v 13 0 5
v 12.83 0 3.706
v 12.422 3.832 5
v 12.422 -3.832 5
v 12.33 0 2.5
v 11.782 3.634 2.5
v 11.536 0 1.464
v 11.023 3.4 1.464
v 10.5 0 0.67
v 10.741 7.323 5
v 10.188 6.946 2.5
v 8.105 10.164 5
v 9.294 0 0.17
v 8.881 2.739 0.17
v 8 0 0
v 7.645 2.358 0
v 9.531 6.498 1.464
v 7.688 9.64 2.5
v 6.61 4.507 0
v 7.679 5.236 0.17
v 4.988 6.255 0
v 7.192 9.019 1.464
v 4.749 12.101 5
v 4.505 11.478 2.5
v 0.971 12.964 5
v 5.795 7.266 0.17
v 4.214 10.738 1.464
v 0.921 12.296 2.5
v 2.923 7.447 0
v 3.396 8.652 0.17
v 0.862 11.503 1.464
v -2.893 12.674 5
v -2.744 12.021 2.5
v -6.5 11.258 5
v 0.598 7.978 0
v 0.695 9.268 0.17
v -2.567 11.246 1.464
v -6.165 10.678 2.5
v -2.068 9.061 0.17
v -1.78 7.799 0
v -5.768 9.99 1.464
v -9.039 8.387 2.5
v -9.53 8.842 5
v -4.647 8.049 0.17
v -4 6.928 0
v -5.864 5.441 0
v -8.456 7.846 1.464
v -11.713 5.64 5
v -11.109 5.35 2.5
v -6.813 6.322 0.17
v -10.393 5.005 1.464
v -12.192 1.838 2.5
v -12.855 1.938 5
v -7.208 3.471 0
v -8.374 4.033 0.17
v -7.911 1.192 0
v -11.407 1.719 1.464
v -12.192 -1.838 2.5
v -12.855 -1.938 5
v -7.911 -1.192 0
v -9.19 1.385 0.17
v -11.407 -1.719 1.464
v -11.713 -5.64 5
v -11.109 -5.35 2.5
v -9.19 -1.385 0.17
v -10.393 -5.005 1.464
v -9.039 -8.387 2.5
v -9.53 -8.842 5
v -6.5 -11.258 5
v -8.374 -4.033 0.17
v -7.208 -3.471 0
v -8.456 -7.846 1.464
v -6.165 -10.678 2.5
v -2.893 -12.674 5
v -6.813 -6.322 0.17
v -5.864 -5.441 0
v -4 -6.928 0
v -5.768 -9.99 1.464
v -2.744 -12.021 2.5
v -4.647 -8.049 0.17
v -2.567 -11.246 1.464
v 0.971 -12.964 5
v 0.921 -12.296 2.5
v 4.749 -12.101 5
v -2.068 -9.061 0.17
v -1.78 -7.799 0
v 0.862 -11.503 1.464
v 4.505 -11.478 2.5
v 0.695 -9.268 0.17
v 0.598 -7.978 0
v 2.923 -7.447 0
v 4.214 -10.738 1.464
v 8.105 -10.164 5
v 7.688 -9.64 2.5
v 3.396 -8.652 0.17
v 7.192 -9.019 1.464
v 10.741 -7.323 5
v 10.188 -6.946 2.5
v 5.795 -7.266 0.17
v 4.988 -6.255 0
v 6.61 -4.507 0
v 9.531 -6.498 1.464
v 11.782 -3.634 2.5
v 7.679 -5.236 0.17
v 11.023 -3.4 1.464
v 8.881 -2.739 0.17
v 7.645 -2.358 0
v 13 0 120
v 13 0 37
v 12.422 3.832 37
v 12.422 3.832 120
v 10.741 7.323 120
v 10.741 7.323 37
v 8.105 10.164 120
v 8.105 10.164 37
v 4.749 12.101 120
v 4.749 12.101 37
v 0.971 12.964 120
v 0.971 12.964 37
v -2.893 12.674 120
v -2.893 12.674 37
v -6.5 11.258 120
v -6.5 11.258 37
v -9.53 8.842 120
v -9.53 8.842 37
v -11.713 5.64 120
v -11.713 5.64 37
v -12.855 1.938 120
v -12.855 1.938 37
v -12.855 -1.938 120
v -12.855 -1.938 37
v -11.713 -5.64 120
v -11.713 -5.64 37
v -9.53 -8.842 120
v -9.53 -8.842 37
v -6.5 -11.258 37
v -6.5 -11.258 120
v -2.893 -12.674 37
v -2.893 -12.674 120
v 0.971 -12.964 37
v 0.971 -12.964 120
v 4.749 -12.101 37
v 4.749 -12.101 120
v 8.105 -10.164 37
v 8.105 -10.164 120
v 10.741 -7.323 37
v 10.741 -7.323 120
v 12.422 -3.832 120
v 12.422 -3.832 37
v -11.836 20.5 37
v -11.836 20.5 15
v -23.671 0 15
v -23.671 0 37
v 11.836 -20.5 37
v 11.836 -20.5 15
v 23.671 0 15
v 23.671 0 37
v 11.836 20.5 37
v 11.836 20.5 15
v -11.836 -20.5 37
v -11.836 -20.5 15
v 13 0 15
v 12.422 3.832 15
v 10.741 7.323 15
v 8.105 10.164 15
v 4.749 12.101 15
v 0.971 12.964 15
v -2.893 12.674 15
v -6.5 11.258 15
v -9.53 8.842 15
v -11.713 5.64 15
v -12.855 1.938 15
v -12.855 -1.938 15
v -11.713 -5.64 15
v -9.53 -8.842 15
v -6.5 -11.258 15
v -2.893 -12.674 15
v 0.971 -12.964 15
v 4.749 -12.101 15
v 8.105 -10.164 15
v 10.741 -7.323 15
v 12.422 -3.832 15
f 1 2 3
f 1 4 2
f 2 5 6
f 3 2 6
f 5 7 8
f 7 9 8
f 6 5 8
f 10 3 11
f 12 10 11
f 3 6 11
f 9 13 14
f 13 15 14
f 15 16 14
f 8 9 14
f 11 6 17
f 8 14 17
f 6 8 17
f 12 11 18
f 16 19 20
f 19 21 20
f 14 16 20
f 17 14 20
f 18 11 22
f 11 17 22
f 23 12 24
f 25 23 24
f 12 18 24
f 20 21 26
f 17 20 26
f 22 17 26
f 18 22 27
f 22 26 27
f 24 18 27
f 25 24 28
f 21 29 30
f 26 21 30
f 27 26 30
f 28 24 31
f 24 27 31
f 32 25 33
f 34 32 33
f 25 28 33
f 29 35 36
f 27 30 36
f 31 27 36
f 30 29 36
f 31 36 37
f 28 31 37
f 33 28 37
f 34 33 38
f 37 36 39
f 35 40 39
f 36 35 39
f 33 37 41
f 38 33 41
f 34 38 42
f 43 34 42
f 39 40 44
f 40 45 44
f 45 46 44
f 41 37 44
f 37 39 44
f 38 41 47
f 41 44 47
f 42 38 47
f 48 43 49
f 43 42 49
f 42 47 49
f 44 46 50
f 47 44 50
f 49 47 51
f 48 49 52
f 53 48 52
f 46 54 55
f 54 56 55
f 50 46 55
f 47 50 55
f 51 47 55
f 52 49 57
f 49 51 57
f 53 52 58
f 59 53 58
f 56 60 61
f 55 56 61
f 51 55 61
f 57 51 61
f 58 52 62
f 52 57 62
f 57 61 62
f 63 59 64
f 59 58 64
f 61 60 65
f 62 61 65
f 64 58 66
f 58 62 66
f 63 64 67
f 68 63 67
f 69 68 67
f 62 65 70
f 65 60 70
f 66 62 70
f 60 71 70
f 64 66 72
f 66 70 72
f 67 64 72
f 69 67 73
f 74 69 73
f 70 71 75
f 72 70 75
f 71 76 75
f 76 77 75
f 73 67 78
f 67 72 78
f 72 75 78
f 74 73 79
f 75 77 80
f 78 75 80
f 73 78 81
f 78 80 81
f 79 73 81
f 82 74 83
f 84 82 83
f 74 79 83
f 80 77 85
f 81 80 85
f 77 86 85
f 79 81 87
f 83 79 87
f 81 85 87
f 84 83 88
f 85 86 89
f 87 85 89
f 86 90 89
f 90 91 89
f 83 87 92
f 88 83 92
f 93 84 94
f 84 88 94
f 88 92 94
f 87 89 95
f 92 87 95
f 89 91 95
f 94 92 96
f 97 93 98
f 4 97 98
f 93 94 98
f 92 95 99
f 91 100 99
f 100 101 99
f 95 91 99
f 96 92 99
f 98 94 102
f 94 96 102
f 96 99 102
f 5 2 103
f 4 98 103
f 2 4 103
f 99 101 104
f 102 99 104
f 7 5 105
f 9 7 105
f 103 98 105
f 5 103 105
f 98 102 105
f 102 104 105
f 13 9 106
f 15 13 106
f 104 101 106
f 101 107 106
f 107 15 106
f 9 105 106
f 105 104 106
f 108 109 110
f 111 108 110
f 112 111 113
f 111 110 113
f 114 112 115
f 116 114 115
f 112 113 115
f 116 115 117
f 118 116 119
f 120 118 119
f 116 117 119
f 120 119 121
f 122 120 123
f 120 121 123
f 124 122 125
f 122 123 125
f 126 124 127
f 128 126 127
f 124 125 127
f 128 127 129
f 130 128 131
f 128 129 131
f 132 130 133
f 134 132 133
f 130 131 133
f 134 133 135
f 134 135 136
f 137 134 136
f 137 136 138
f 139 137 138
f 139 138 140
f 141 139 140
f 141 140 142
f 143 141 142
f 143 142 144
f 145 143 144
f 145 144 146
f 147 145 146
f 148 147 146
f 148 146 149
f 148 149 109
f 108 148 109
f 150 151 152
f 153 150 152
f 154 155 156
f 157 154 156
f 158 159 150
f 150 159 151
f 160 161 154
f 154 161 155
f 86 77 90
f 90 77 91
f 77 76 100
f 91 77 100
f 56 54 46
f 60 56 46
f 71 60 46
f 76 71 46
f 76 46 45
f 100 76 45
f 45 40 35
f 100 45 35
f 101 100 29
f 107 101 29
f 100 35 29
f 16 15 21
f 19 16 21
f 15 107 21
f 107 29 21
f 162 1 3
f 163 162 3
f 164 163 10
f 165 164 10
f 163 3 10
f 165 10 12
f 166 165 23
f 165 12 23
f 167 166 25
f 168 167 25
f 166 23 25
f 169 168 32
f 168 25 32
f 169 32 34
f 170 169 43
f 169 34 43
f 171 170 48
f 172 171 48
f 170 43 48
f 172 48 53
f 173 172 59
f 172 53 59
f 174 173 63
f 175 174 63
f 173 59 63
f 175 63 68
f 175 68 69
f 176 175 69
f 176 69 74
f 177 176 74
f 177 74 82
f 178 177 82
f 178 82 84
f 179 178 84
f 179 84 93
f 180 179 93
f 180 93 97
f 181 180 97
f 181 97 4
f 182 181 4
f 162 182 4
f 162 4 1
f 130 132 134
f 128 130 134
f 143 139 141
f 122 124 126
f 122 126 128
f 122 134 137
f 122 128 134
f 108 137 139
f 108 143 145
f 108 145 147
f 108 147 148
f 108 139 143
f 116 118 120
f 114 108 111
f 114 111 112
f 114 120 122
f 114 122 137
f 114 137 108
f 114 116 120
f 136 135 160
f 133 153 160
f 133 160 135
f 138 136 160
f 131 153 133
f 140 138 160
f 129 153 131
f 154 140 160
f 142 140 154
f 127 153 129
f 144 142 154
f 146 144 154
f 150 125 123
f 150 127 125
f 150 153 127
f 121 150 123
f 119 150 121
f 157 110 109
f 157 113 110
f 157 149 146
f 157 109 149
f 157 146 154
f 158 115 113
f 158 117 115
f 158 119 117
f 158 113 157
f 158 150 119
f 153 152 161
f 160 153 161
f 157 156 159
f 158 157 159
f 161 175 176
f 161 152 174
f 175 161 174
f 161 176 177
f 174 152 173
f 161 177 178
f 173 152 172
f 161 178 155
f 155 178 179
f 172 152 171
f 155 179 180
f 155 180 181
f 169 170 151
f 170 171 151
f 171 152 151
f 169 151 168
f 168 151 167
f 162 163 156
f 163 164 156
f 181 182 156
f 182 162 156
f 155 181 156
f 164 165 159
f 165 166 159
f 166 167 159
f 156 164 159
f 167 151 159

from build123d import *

# Parameters (mm, degrees)
F0_R     = 13
F1_DEPTH = 120
F2_R     = 5
F4_R     = 13
F5_DEPTH = 22


with BuildPart() as f1:
    # F0 (on Top) → F1 (new body)
    with BuildSketch(Plane.XY):
        Circle(F0_R)
    extrude(amount=F1_DEPTH)

    # F2
    f2_edges = [f1.edges().sort_by_distance(p)[0] for p in [
        (-13, 0, 0),
    ]]
    fillet(f2_edges, radius=F2_R)

    # F4 (on offset) → F5 (join)
    with BuildSketch(Plane.XY.offset(15)):
        Polygon((11.835681, 20.5), (-11.835681, 20.5), (-23.671361, 0), (-11.835681, -20.5), (11.835681, -20.5), (23.671361, 0), align=None)
        Circle(F4_R, mode=Mode.SUBTRACT)
    extrude(amount=F5_DEPTH)


solid = f1.part
